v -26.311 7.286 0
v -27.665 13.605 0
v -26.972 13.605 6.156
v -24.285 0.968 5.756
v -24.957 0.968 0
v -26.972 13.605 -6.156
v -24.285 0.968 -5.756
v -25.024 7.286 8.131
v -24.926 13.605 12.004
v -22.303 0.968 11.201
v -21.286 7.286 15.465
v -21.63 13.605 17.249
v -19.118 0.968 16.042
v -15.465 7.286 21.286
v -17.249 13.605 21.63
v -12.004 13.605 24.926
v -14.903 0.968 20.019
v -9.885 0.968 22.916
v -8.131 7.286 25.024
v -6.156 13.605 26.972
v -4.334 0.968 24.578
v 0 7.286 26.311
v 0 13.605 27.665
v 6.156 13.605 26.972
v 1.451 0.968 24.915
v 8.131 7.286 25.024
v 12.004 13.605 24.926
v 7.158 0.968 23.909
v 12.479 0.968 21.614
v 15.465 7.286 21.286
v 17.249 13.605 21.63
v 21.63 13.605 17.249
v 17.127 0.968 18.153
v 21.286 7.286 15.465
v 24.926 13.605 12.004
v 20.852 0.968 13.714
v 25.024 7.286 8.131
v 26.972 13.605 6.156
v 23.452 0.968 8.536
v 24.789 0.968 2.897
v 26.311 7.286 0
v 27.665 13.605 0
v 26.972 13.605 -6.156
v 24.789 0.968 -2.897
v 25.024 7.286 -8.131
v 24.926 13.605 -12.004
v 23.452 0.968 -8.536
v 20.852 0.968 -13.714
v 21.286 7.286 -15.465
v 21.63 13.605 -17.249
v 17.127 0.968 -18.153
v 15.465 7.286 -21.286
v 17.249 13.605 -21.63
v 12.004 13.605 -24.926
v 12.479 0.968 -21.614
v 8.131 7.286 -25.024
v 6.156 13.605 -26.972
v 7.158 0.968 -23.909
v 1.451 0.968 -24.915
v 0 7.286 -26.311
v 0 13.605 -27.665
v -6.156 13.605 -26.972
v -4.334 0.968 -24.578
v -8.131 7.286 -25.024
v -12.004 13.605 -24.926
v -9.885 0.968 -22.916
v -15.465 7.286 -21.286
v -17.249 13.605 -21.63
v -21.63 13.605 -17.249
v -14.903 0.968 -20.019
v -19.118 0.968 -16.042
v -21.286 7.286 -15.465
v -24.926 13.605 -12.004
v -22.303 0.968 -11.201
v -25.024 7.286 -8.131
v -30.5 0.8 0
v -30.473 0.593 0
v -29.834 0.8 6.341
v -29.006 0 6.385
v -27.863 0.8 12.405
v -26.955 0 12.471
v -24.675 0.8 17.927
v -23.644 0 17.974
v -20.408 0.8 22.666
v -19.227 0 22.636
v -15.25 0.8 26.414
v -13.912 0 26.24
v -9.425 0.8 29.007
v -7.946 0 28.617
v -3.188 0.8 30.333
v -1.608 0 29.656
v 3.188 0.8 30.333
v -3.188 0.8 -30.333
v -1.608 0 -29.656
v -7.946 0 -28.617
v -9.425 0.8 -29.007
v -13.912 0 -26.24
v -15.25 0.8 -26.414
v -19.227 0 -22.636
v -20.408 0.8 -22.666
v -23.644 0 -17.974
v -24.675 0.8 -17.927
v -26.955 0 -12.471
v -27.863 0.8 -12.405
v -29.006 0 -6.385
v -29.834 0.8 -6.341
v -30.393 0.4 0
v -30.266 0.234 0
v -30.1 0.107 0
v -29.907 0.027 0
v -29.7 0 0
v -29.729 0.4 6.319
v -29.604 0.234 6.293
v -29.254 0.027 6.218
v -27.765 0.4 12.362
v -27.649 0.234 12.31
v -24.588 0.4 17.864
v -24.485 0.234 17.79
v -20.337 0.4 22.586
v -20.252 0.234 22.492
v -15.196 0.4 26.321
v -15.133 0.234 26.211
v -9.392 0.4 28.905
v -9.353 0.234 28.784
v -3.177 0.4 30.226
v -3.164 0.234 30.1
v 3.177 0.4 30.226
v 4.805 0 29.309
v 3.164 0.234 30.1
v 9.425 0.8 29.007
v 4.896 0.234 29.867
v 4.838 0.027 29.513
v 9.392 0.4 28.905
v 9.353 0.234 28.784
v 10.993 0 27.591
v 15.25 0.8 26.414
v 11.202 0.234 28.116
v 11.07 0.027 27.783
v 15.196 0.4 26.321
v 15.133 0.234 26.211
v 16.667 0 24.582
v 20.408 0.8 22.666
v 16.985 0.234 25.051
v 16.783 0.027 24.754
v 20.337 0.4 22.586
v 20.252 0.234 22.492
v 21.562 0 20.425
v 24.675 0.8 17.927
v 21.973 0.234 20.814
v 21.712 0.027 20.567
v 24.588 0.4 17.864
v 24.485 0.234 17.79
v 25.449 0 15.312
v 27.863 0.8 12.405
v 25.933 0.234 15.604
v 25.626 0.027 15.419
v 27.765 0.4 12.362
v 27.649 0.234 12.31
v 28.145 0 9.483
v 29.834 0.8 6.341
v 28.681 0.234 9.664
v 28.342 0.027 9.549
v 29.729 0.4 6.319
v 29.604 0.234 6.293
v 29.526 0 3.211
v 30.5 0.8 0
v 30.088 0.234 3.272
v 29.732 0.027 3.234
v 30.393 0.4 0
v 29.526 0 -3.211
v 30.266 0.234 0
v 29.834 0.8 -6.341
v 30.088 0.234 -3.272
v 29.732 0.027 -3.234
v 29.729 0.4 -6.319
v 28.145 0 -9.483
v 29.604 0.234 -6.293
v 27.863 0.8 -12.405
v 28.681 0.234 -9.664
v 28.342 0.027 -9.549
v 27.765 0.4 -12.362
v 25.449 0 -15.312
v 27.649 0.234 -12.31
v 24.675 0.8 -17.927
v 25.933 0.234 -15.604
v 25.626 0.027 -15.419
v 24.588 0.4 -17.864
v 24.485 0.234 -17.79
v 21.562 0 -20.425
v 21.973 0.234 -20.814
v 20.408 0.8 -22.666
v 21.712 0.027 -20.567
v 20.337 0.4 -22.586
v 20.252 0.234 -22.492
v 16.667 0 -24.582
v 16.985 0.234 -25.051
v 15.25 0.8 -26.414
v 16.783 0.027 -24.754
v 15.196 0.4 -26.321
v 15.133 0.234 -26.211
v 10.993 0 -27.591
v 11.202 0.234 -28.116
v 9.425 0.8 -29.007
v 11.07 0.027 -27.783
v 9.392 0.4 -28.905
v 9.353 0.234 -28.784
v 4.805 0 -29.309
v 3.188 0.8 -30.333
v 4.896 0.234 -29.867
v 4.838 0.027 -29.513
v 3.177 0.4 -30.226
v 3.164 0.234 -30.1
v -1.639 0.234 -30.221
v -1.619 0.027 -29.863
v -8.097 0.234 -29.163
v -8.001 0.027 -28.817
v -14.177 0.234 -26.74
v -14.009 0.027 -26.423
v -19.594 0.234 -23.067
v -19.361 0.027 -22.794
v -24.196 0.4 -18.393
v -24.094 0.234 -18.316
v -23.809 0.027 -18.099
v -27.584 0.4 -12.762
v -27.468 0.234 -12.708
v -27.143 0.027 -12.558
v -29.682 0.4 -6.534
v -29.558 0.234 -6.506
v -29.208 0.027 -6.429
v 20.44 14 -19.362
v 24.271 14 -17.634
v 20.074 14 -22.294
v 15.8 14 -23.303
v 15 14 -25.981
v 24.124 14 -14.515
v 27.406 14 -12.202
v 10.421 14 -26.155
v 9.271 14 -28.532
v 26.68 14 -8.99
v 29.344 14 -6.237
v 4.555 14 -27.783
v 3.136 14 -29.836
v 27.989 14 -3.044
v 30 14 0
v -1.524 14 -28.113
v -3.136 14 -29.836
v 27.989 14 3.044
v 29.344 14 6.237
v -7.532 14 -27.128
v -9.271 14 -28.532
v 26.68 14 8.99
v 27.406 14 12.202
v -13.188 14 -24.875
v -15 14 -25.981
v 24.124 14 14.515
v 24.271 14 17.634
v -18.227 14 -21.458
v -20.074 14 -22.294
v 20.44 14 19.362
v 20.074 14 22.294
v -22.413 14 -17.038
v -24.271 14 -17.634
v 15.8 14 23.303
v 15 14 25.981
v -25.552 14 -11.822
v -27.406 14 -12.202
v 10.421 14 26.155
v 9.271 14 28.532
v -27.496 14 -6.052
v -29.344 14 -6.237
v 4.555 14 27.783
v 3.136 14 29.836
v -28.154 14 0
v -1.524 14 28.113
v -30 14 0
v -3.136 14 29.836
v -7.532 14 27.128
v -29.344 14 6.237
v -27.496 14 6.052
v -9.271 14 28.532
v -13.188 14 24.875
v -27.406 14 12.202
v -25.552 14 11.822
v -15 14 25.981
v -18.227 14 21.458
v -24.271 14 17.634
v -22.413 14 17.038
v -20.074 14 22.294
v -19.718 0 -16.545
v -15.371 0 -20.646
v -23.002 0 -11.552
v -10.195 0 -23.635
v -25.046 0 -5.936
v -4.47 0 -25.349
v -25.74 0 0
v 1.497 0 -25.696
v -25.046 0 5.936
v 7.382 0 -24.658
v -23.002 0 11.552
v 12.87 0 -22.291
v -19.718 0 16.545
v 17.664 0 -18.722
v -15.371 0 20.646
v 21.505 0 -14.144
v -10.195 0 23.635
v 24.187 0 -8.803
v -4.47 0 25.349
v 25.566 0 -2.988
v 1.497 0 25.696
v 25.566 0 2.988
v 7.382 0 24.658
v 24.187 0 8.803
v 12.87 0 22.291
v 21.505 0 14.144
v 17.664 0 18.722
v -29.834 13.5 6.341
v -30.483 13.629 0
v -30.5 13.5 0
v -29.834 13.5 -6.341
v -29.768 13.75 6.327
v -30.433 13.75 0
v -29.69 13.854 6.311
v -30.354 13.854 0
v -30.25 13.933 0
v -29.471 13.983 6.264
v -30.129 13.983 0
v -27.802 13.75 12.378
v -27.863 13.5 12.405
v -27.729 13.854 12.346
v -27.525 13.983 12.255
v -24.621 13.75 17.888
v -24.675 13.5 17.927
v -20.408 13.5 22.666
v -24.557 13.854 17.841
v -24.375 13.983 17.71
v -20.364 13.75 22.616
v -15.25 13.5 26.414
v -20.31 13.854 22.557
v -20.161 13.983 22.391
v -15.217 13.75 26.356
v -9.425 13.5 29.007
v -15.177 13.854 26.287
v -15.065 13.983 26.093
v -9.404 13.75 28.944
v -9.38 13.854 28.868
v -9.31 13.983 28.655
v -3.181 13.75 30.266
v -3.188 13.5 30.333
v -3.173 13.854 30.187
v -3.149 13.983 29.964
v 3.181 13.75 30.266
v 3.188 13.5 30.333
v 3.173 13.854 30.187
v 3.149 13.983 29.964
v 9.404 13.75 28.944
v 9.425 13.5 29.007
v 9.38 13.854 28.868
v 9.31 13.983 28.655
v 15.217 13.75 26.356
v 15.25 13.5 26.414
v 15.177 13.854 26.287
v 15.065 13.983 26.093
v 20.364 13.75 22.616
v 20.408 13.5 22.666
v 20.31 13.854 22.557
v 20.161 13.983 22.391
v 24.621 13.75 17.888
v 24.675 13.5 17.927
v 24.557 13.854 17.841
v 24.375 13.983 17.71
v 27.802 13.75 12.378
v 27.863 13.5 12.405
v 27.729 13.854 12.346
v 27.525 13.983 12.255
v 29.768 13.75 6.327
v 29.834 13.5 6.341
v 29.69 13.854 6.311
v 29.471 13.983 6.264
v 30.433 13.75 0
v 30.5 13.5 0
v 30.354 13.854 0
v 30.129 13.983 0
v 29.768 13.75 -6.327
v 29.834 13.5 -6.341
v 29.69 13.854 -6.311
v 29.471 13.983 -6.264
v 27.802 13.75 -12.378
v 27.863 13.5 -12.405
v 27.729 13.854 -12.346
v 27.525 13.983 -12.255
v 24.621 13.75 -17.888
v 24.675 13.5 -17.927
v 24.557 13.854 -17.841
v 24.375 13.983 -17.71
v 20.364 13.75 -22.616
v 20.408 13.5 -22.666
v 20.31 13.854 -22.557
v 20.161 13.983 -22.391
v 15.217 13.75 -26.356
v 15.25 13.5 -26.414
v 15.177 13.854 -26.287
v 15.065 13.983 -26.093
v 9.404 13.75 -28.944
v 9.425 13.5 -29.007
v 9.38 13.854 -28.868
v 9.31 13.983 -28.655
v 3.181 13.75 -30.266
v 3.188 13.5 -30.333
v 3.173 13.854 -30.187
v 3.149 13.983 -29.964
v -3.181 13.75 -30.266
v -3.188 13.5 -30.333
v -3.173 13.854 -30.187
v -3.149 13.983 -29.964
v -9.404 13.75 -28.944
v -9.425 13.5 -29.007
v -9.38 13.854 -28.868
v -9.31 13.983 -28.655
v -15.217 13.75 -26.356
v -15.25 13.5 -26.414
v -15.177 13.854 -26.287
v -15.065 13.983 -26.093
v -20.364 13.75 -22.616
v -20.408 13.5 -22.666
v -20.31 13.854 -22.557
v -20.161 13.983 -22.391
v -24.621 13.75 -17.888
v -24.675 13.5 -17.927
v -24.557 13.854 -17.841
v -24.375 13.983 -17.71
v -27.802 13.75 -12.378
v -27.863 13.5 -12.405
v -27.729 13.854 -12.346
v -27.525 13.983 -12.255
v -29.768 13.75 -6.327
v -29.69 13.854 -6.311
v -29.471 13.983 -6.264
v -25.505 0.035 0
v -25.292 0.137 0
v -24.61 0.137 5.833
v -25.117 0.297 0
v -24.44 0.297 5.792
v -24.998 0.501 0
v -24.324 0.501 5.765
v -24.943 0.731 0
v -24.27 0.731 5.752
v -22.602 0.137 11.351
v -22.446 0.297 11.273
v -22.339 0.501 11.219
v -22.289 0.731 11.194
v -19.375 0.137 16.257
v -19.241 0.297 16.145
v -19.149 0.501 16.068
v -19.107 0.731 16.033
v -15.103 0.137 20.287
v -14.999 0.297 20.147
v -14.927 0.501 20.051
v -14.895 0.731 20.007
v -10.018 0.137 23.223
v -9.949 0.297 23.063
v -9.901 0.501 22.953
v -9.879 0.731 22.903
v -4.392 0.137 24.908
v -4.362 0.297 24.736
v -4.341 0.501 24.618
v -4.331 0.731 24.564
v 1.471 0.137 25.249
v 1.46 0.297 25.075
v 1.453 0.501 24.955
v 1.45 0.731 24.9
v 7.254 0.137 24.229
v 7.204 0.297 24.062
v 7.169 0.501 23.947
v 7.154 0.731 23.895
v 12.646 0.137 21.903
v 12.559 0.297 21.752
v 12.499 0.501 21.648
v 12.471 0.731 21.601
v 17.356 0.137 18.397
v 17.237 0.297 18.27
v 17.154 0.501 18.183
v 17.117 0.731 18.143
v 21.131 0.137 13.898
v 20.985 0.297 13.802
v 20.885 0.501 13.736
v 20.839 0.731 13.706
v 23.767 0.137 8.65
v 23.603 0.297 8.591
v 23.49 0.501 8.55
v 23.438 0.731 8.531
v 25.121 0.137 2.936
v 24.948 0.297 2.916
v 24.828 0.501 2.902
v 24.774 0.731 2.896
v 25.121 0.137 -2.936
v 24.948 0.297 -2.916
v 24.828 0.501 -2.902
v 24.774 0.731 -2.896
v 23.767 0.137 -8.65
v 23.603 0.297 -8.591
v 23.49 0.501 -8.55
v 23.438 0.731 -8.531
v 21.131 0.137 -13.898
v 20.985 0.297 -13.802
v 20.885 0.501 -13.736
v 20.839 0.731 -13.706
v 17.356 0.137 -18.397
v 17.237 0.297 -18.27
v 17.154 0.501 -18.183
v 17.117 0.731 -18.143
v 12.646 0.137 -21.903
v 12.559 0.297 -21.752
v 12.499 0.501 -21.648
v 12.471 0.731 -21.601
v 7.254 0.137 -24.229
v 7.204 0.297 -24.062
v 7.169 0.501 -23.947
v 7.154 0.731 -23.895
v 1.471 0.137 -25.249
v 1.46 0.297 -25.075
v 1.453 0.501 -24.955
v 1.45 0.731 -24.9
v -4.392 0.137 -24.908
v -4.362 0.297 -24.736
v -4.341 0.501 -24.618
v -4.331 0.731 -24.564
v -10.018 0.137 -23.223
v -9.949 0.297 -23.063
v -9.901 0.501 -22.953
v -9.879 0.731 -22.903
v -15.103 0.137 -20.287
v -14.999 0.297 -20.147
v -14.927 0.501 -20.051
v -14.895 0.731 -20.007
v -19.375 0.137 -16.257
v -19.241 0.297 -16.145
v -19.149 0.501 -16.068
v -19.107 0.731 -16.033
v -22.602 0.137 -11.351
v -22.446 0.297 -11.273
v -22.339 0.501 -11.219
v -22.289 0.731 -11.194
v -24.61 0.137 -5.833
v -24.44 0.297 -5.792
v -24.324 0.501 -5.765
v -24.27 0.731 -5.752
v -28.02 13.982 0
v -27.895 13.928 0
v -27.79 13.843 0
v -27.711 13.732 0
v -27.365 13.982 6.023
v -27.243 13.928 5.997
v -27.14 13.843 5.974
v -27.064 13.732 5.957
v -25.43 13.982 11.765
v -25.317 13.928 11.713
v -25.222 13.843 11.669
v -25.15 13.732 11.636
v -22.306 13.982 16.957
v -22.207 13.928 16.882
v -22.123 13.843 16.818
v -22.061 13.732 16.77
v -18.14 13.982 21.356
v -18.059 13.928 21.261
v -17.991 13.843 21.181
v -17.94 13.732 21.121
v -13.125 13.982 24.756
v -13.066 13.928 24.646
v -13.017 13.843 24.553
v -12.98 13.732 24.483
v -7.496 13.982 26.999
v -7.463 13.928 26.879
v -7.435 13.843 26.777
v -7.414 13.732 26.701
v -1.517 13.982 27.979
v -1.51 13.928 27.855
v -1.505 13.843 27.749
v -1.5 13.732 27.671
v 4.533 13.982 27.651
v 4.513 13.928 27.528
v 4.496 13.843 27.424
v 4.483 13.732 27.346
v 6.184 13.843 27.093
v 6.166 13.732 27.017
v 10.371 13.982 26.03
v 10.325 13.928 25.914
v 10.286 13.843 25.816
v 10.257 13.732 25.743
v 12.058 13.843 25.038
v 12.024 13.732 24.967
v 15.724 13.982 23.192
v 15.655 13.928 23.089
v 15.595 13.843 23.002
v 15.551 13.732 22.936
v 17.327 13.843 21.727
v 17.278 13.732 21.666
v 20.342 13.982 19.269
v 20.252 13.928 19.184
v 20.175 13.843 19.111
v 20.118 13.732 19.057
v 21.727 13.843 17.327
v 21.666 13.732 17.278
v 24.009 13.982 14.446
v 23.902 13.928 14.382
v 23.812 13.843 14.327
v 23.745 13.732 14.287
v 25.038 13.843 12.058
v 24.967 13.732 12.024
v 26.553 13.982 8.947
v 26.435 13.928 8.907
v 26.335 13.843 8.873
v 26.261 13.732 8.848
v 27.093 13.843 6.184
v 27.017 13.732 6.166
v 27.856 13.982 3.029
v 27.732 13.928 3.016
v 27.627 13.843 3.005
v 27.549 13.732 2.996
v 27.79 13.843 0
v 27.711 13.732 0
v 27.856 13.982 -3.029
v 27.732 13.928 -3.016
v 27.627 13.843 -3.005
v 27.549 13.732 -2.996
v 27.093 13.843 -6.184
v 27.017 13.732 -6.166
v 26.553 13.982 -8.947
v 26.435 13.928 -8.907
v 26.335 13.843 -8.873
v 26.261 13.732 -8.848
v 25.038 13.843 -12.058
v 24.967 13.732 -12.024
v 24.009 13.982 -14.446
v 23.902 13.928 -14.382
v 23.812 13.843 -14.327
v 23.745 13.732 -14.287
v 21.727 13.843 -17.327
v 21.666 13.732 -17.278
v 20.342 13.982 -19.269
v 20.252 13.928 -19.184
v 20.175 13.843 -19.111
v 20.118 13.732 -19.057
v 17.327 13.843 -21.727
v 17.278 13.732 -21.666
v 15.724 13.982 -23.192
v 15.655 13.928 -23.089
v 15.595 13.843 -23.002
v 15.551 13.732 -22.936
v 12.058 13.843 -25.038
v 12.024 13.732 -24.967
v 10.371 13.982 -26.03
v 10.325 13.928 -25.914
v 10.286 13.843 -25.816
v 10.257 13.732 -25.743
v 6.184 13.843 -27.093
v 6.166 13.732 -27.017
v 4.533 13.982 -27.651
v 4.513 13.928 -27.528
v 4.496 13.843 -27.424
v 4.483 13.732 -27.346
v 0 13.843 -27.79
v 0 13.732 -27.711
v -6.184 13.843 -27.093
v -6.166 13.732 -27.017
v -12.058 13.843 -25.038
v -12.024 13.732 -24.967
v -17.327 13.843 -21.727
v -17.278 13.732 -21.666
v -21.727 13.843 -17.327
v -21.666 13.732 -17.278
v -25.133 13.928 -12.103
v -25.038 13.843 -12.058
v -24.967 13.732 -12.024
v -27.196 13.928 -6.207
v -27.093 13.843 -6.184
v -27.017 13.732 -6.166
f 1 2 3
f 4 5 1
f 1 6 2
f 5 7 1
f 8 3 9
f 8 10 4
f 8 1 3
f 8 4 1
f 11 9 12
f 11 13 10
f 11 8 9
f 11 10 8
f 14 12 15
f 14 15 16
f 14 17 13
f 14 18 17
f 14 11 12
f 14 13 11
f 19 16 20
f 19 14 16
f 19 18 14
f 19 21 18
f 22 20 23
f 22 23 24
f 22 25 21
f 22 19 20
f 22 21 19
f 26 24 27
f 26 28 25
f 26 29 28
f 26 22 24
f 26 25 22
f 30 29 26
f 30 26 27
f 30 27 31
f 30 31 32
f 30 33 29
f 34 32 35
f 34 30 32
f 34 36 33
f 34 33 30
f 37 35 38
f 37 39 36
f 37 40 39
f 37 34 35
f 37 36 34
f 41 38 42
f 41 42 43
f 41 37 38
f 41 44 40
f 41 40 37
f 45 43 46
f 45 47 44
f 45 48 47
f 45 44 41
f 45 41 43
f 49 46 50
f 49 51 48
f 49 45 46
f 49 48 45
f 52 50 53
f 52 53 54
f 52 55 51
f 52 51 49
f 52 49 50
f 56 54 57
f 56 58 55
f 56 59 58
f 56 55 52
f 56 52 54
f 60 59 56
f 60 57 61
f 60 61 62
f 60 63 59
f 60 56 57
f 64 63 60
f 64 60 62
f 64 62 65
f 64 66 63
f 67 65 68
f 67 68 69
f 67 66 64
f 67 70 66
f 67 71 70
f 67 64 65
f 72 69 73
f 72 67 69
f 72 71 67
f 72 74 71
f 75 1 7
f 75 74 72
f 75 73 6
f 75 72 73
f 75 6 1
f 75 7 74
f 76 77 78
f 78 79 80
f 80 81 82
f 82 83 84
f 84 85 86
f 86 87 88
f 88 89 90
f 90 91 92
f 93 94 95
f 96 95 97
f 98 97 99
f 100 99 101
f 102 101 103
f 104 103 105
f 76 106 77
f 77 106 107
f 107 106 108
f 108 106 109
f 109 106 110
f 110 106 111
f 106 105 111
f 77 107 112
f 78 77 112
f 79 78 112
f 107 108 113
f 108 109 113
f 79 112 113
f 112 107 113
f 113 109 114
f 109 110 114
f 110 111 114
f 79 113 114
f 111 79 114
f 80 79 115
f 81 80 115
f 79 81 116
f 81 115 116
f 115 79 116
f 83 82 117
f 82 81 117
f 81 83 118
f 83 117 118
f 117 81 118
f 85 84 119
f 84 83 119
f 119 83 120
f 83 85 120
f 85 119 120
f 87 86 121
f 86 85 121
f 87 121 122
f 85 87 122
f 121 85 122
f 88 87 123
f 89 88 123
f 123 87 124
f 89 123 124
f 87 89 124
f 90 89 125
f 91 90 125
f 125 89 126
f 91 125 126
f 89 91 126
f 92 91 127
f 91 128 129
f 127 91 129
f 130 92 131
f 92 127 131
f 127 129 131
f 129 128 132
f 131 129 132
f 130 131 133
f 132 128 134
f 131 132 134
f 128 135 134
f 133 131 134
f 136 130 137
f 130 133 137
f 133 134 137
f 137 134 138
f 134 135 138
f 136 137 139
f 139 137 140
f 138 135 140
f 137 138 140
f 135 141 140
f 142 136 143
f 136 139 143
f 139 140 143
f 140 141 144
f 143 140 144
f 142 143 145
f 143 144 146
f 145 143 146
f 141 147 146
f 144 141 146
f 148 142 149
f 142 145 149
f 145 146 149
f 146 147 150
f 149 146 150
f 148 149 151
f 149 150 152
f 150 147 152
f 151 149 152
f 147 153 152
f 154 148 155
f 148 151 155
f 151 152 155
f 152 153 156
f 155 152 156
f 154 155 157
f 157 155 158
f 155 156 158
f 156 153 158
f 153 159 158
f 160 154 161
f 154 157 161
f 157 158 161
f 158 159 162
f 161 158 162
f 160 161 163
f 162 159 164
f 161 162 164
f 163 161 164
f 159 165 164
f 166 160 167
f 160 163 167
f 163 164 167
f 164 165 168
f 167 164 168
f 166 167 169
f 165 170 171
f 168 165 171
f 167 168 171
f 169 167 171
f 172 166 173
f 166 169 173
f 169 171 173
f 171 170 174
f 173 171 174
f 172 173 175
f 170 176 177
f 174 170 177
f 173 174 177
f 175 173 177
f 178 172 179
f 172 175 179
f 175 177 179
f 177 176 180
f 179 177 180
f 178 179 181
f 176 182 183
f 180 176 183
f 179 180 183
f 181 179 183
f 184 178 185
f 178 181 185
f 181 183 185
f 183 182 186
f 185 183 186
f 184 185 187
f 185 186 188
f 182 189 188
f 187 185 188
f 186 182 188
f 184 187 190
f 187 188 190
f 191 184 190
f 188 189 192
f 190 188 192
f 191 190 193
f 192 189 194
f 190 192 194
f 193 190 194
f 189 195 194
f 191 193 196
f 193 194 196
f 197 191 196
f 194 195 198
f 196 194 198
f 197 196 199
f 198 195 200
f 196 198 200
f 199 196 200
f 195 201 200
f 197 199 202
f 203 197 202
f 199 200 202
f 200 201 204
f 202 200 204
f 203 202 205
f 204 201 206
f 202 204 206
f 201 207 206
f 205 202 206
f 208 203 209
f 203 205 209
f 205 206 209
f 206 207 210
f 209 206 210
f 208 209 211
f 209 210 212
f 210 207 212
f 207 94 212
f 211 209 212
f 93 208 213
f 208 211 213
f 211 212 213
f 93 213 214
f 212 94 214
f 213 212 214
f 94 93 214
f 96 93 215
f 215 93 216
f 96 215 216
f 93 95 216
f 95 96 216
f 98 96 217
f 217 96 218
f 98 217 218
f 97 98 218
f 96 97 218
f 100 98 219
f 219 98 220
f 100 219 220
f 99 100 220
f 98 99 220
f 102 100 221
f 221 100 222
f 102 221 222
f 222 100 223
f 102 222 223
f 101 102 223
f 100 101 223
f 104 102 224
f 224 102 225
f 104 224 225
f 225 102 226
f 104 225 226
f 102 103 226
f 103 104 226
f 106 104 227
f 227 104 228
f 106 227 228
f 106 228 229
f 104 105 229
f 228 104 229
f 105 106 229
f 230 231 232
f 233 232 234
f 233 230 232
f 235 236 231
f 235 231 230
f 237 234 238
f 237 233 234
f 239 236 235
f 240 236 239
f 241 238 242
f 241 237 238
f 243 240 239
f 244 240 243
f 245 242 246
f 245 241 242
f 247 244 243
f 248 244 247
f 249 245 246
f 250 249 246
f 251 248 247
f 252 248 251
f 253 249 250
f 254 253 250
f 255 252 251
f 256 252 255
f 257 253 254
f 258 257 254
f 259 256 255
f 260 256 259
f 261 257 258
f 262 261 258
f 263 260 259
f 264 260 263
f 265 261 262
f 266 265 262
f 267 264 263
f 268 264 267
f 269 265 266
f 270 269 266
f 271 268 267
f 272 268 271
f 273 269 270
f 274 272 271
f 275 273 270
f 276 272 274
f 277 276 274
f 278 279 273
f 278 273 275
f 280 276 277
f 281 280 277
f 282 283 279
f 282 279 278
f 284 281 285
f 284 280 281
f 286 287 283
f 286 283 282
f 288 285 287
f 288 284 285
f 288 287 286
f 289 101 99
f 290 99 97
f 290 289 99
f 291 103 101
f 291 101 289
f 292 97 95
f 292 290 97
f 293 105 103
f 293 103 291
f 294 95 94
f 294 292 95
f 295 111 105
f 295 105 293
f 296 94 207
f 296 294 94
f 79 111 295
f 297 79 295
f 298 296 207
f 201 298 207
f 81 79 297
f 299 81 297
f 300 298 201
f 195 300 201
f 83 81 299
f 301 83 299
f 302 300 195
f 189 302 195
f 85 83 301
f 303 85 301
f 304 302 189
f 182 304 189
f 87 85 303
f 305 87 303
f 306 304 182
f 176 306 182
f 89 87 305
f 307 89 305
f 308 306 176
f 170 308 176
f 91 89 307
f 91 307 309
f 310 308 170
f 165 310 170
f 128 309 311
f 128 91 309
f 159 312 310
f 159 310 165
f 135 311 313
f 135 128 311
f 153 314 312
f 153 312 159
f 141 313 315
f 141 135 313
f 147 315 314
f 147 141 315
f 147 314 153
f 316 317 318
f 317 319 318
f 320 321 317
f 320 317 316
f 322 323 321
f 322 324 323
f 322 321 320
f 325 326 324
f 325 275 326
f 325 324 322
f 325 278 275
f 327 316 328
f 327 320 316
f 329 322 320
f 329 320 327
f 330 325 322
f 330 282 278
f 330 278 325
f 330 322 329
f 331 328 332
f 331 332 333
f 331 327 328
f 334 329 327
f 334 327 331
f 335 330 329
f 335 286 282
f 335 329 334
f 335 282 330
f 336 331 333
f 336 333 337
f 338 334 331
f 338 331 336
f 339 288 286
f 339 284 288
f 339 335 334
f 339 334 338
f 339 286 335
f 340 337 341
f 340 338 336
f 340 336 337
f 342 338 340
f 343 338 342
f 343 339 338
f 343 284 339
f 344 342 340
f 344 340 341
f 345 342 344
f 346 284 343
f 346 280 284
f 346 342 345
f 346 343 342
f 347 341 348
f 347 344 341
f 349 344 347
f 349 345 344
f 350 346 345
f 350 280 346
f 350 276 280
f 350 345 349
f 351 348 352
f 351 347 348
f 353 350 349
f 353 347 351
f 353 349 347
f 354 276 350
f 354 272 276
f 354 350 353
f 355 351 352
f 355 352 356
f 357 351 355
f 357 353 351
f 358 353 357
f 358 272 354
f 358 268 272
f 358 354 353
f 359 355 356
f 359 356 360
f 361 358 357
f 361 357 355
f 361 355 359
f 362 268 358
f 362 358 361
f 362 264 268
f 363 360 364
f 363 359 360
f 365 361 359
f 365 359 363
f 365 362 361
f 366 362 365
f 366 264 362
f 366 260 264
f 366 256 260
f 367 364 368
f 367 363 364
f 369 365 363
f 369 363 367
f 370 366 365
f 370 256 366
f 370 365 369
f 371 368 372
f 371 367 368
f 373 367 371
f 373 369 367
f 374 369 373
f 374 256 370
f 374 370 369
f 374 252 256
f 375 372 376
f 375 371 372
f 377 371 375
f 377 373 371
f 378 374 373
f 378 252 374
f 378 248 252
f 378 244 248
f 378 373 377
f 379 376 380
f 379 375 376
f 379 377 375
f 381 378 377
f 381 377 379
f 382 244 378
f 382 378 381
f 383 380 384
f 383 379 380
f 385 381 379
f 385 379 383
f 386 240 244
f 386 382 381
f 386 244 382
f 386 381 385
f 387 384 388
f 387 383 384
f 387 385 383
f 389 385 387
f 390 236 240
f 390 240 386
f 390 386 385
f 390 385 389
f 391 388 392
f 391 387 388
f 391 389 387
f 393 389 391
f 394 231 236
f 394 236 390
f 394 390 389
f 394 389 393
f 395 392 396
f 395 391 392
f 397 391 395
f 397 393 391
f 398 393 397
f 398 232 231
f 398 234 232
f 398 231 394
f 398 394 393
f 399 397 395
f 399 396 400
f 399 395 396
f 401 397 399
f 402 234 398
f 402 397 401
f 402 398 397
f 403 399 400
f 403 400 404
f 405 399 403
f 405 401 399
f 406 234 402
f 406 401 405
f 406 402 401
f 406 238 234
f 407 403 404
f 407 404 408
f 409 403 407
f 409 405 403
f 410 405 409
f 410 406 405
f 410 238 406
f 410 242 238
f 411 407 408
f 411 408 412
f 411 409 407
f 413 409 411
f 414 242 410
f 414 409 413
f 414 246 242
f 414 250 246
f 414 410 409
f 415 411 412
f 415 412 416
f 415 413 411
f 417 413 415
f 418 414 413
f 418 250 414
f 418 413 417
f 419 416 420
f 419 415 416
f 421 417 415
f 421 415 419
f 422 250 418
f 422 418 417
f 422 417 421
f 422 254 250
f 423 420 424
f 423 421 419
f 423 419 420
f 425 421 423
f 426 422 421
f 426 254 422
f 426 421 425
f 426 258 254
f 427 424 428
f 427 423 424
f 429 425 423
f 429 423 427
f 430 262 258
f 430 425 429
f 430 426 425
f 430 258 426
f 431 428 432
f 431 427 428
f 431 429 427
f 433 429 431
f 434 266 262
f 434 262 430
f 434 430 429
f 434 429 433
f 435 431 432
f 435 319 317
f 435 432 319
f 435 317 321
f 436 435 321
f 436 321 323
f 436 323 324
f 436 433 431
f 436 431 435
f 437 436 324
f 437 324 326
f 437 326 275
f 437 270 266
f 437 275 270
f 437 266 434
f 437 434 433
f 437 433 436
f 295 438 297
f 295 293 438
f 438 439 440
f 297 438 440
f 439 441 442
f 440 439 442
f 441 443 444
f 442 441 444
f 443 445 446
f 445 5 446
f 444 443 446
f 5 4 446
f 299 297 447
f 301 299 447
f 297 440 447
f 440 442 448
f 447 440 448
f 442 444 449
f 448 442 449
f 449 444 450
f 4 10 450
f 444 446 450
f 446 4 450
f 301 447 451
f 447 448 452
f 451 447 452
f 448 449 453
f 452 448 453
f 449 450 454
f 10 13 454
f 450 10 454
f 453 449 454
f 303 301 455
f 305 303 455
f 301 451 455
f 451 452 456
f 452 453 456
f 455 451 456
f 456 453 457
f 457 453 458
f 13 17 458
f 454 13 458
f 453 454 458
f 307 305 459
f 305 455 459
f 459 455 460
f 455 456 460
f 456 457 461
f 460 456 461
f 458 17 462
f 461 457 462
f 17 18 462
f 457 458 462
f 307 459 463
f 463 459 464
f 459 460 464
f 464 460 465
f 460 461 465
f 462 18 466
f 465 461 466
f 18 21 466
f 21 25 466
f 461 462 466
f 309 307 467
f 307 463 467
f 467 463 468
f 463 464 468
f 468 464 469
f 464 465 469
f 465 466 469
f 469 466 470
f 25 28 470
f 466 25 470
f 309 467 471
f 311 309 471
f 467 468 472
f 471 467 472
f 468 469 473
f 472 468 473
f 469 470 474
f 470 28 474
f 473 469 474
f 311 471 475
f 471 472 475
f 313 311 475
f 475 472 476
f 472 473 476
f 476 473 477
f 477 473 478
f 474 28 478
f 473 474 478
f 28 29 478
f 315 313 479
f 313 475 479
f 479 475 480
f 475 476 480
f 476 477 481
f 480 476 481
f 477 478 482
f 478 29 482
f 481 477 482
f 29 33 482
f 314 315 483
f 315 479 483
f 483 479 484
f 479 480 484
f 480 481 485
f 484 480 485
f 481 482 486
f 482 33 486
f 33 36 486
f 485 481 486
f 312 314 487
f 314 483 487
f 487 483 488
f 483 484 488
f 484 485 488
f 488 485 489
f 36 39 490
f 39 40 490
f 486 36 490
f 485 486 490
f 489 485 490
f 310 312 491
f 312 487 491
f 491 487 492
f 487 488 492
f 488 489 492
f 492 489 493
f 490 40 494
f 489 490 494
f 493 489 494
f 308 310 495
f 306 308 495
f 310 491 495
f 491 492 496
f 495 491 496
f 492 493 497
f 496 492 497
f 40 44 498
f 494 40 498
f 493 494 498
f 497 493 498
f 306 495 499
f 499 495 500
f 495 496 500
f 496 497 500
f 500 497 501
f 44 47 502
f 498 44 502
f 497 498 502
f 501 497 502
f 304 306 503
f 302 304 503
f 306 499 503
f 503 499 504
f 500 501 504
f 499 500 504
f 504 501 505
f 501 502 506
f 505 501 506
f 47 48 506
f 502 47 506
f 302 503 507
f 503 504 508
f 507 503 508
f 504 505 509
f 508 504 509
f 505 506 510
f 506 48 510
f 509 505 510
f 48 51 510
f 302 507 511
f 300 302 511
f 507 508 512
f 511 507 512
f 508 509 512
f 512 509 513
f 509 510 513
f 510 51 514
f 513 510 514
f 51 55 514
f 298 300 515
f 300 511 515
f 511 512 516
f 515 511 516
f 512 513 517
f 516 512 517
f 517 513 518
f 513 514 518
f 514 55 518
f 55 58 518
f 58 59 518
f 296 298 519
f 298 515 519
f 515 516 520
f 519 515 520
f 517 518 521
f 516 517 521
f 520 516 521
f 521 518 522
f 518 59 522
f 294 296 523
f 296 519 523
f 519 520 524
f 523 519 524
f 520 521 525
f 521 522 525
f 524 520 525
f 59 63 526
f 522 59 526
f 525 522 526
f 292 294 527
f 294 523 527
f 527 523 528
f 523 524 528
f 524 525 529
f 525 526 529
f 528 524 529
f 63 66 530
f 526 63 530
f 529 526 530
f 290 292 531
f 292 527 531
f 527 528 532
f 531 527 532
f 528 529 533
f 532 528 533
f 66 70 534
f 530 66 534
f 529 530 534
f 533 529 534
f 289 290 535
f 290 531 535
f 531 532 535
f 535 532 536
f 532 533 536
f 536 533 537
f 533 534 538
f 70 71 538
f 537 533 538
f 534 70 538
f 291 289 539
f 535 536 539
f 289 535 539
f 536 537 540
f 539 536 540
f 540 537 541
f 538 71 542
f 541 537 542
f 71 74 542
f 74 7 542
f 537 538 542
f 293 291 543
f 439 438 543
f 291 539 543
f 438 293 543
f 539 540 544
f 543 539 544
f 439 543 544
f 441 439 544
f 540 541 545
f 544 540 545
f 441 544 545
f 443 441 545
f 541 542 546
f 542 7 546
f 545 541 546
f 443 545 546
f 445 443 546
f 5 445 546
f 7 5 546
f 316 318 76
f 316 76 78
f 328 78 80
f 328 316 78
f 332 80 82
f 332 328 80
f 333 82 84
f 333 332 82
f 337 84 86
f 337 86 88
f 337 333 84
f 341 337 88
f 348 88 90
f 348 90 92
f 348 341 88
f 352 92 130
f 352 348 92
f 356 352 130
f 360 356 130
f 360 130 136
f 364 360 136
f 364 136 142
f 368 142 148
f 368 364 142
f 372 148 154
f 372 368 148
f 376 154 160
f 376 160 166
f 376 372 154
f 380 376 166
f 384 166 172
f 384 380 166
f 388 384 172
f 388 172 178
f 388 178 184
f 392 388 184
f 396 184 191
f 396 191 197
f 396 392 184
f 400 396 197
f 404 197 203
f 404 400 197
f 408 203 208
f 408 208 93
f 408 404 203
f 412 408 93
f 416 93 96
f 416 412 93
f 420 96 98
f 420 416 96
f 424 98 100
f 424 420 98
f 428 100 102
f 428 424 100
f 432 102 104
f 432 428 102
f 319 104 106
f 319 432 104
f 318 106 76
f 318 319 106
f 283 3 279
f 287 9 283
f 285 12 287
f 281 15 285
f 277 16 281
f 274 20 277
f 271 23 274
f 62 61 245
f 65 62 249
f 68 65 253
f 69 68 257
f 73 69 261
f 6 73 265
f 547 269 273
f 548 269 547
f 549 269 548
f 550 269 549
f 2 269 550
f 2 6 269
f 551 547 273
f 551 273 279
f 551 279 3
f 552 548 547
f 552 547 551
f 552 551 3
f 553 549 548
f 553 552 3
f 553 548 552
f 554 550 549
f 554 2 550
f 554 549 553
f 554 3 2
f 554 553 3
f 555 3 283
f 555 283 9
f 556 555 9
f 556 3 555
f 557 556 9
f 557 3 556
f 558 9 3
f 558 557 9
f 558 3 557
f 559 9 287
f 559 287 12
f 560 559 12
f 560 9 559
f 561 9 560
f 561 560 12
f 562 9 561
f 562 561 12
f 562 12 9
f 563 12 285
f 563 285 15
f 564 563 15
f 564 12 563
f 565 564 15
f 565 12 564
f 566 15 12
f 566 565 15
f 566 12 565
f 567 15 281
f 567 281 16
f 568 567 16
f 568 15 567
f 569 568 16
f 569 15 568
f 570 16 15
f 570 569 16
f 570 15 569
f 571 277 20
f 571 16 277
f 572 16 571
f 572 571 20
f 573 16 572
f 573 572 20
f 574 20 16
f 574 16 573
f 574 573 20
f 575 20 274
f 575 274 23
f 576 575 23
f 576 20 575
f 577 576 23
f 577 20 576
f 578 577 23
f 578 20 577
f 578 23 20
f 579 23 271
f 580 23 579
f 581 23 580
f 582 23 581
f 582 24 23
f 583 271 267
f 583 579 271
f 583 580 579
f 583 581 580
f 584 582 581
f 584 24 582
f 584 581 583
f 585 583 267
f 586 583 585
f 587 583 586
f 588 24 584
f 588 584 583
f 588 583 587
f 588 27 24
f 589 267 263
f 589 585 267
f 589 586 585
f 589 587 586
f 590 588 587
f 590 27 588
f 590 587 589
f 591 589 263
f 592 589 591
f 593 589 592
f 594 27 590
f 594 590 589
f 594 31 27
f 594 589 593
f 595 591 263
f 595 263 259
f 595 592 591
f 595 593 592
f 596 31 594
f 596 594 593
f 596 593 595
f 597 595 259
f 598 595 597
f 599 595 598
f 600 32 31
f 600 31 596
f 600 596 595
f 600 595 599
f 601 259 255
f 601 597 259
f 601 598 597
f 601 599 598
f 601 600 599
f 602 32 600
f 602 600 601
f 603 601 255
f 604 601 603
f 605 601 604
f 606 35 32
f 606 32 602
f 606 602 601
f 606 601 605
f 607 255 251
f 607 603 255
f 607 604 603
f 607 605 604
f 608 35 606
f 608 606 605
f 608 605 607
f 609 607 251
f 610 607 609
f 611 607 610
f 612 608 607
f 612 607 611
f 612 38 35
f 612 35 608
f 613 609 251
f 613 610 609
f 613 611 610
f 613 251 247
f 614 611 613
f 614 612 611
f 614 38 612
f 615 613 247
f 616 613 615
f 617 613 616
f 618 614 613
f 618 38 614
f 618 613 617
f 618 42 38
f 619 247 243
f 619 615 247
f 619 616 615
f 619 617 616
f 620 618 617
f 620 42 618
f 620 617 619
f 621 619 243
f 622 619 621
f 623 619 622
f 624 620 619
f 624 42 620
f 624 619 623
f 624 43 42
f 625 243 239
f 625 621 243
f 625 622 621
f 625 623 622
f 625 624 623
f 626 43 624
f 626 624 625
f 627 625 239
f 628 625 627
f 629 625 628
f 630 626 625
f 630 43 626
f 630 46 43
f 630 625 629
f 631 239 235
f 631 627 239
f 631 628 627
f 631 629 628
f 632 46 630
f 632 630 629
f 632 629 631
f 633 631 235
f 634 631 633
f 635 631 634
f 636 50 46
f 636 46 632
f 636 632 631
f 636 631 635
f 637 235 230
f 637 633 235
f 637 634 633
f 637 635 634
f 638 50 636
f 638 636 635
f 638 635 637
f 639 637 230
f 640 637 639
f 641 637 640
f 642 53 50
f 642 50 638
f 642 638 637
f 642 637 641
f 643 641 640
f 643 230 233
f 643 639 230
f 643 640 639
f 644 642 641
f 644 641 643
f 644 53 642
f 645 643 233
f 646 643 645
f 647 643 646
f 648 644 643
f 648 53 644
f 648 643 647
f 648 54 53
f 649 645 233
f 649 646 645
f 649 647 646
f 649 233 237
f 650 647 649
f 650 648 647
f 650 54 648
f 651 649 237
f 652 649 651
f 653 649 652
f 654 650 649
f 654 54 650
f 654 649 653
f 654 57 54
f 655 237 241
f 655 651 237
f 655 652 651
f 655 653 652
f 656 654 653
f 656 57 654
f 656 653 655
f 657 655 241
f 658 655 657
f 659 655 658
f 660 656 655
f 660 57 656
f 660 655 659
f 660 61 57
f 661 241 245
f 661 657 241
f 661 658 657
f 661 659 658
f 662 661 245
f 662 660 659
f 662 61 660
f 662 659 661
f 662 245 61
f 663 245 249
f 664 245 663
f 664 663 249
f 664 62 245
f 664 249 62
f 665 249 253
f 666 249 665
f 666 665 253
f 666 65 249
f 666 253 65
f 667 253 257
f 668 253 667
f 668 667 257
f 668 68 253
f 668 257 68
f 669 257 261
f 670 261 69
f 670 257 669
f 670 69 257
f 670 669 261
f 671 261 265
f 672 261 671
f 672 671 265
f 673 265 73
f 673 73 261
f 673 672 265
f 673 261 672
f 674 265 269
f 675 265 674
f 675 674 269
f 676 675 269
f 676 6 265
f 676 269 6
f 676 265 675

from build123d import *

# Parameters (mm, degrees)
FILLET1_R = 0.5
FILLET3_R = 0.8


with BuildPart() as part:
    # Sketch2 → Revolve1 (revolve)
    with BuildSketch(Plane.XY):
        Polygon((-30.5, 0), (-30.5, 14), (-27.75, 14), (-24.75, 0), align=None)
    revolve(axis=Axis((0, 0, 0), (0, 1, 0)))

    # Fillet1
    fillet1_edges = [part.edges().sort_by_distance(p)[0] for p in [
        (27.75, 14, 0),
        (30.5, 14, 0),
    ]]
    fillet(fillet1_edges, radius=FILLET1_R)

    # Fillet3
    fillet3_edges = [part.edges().sort_by_distance(p)[0] for p in [
        (30.5, 0, 0),
        (24.75, 0, 0),
    ]]
    fillet(fillet3_edges, radius=FILLET3_R)


solid = part.part
